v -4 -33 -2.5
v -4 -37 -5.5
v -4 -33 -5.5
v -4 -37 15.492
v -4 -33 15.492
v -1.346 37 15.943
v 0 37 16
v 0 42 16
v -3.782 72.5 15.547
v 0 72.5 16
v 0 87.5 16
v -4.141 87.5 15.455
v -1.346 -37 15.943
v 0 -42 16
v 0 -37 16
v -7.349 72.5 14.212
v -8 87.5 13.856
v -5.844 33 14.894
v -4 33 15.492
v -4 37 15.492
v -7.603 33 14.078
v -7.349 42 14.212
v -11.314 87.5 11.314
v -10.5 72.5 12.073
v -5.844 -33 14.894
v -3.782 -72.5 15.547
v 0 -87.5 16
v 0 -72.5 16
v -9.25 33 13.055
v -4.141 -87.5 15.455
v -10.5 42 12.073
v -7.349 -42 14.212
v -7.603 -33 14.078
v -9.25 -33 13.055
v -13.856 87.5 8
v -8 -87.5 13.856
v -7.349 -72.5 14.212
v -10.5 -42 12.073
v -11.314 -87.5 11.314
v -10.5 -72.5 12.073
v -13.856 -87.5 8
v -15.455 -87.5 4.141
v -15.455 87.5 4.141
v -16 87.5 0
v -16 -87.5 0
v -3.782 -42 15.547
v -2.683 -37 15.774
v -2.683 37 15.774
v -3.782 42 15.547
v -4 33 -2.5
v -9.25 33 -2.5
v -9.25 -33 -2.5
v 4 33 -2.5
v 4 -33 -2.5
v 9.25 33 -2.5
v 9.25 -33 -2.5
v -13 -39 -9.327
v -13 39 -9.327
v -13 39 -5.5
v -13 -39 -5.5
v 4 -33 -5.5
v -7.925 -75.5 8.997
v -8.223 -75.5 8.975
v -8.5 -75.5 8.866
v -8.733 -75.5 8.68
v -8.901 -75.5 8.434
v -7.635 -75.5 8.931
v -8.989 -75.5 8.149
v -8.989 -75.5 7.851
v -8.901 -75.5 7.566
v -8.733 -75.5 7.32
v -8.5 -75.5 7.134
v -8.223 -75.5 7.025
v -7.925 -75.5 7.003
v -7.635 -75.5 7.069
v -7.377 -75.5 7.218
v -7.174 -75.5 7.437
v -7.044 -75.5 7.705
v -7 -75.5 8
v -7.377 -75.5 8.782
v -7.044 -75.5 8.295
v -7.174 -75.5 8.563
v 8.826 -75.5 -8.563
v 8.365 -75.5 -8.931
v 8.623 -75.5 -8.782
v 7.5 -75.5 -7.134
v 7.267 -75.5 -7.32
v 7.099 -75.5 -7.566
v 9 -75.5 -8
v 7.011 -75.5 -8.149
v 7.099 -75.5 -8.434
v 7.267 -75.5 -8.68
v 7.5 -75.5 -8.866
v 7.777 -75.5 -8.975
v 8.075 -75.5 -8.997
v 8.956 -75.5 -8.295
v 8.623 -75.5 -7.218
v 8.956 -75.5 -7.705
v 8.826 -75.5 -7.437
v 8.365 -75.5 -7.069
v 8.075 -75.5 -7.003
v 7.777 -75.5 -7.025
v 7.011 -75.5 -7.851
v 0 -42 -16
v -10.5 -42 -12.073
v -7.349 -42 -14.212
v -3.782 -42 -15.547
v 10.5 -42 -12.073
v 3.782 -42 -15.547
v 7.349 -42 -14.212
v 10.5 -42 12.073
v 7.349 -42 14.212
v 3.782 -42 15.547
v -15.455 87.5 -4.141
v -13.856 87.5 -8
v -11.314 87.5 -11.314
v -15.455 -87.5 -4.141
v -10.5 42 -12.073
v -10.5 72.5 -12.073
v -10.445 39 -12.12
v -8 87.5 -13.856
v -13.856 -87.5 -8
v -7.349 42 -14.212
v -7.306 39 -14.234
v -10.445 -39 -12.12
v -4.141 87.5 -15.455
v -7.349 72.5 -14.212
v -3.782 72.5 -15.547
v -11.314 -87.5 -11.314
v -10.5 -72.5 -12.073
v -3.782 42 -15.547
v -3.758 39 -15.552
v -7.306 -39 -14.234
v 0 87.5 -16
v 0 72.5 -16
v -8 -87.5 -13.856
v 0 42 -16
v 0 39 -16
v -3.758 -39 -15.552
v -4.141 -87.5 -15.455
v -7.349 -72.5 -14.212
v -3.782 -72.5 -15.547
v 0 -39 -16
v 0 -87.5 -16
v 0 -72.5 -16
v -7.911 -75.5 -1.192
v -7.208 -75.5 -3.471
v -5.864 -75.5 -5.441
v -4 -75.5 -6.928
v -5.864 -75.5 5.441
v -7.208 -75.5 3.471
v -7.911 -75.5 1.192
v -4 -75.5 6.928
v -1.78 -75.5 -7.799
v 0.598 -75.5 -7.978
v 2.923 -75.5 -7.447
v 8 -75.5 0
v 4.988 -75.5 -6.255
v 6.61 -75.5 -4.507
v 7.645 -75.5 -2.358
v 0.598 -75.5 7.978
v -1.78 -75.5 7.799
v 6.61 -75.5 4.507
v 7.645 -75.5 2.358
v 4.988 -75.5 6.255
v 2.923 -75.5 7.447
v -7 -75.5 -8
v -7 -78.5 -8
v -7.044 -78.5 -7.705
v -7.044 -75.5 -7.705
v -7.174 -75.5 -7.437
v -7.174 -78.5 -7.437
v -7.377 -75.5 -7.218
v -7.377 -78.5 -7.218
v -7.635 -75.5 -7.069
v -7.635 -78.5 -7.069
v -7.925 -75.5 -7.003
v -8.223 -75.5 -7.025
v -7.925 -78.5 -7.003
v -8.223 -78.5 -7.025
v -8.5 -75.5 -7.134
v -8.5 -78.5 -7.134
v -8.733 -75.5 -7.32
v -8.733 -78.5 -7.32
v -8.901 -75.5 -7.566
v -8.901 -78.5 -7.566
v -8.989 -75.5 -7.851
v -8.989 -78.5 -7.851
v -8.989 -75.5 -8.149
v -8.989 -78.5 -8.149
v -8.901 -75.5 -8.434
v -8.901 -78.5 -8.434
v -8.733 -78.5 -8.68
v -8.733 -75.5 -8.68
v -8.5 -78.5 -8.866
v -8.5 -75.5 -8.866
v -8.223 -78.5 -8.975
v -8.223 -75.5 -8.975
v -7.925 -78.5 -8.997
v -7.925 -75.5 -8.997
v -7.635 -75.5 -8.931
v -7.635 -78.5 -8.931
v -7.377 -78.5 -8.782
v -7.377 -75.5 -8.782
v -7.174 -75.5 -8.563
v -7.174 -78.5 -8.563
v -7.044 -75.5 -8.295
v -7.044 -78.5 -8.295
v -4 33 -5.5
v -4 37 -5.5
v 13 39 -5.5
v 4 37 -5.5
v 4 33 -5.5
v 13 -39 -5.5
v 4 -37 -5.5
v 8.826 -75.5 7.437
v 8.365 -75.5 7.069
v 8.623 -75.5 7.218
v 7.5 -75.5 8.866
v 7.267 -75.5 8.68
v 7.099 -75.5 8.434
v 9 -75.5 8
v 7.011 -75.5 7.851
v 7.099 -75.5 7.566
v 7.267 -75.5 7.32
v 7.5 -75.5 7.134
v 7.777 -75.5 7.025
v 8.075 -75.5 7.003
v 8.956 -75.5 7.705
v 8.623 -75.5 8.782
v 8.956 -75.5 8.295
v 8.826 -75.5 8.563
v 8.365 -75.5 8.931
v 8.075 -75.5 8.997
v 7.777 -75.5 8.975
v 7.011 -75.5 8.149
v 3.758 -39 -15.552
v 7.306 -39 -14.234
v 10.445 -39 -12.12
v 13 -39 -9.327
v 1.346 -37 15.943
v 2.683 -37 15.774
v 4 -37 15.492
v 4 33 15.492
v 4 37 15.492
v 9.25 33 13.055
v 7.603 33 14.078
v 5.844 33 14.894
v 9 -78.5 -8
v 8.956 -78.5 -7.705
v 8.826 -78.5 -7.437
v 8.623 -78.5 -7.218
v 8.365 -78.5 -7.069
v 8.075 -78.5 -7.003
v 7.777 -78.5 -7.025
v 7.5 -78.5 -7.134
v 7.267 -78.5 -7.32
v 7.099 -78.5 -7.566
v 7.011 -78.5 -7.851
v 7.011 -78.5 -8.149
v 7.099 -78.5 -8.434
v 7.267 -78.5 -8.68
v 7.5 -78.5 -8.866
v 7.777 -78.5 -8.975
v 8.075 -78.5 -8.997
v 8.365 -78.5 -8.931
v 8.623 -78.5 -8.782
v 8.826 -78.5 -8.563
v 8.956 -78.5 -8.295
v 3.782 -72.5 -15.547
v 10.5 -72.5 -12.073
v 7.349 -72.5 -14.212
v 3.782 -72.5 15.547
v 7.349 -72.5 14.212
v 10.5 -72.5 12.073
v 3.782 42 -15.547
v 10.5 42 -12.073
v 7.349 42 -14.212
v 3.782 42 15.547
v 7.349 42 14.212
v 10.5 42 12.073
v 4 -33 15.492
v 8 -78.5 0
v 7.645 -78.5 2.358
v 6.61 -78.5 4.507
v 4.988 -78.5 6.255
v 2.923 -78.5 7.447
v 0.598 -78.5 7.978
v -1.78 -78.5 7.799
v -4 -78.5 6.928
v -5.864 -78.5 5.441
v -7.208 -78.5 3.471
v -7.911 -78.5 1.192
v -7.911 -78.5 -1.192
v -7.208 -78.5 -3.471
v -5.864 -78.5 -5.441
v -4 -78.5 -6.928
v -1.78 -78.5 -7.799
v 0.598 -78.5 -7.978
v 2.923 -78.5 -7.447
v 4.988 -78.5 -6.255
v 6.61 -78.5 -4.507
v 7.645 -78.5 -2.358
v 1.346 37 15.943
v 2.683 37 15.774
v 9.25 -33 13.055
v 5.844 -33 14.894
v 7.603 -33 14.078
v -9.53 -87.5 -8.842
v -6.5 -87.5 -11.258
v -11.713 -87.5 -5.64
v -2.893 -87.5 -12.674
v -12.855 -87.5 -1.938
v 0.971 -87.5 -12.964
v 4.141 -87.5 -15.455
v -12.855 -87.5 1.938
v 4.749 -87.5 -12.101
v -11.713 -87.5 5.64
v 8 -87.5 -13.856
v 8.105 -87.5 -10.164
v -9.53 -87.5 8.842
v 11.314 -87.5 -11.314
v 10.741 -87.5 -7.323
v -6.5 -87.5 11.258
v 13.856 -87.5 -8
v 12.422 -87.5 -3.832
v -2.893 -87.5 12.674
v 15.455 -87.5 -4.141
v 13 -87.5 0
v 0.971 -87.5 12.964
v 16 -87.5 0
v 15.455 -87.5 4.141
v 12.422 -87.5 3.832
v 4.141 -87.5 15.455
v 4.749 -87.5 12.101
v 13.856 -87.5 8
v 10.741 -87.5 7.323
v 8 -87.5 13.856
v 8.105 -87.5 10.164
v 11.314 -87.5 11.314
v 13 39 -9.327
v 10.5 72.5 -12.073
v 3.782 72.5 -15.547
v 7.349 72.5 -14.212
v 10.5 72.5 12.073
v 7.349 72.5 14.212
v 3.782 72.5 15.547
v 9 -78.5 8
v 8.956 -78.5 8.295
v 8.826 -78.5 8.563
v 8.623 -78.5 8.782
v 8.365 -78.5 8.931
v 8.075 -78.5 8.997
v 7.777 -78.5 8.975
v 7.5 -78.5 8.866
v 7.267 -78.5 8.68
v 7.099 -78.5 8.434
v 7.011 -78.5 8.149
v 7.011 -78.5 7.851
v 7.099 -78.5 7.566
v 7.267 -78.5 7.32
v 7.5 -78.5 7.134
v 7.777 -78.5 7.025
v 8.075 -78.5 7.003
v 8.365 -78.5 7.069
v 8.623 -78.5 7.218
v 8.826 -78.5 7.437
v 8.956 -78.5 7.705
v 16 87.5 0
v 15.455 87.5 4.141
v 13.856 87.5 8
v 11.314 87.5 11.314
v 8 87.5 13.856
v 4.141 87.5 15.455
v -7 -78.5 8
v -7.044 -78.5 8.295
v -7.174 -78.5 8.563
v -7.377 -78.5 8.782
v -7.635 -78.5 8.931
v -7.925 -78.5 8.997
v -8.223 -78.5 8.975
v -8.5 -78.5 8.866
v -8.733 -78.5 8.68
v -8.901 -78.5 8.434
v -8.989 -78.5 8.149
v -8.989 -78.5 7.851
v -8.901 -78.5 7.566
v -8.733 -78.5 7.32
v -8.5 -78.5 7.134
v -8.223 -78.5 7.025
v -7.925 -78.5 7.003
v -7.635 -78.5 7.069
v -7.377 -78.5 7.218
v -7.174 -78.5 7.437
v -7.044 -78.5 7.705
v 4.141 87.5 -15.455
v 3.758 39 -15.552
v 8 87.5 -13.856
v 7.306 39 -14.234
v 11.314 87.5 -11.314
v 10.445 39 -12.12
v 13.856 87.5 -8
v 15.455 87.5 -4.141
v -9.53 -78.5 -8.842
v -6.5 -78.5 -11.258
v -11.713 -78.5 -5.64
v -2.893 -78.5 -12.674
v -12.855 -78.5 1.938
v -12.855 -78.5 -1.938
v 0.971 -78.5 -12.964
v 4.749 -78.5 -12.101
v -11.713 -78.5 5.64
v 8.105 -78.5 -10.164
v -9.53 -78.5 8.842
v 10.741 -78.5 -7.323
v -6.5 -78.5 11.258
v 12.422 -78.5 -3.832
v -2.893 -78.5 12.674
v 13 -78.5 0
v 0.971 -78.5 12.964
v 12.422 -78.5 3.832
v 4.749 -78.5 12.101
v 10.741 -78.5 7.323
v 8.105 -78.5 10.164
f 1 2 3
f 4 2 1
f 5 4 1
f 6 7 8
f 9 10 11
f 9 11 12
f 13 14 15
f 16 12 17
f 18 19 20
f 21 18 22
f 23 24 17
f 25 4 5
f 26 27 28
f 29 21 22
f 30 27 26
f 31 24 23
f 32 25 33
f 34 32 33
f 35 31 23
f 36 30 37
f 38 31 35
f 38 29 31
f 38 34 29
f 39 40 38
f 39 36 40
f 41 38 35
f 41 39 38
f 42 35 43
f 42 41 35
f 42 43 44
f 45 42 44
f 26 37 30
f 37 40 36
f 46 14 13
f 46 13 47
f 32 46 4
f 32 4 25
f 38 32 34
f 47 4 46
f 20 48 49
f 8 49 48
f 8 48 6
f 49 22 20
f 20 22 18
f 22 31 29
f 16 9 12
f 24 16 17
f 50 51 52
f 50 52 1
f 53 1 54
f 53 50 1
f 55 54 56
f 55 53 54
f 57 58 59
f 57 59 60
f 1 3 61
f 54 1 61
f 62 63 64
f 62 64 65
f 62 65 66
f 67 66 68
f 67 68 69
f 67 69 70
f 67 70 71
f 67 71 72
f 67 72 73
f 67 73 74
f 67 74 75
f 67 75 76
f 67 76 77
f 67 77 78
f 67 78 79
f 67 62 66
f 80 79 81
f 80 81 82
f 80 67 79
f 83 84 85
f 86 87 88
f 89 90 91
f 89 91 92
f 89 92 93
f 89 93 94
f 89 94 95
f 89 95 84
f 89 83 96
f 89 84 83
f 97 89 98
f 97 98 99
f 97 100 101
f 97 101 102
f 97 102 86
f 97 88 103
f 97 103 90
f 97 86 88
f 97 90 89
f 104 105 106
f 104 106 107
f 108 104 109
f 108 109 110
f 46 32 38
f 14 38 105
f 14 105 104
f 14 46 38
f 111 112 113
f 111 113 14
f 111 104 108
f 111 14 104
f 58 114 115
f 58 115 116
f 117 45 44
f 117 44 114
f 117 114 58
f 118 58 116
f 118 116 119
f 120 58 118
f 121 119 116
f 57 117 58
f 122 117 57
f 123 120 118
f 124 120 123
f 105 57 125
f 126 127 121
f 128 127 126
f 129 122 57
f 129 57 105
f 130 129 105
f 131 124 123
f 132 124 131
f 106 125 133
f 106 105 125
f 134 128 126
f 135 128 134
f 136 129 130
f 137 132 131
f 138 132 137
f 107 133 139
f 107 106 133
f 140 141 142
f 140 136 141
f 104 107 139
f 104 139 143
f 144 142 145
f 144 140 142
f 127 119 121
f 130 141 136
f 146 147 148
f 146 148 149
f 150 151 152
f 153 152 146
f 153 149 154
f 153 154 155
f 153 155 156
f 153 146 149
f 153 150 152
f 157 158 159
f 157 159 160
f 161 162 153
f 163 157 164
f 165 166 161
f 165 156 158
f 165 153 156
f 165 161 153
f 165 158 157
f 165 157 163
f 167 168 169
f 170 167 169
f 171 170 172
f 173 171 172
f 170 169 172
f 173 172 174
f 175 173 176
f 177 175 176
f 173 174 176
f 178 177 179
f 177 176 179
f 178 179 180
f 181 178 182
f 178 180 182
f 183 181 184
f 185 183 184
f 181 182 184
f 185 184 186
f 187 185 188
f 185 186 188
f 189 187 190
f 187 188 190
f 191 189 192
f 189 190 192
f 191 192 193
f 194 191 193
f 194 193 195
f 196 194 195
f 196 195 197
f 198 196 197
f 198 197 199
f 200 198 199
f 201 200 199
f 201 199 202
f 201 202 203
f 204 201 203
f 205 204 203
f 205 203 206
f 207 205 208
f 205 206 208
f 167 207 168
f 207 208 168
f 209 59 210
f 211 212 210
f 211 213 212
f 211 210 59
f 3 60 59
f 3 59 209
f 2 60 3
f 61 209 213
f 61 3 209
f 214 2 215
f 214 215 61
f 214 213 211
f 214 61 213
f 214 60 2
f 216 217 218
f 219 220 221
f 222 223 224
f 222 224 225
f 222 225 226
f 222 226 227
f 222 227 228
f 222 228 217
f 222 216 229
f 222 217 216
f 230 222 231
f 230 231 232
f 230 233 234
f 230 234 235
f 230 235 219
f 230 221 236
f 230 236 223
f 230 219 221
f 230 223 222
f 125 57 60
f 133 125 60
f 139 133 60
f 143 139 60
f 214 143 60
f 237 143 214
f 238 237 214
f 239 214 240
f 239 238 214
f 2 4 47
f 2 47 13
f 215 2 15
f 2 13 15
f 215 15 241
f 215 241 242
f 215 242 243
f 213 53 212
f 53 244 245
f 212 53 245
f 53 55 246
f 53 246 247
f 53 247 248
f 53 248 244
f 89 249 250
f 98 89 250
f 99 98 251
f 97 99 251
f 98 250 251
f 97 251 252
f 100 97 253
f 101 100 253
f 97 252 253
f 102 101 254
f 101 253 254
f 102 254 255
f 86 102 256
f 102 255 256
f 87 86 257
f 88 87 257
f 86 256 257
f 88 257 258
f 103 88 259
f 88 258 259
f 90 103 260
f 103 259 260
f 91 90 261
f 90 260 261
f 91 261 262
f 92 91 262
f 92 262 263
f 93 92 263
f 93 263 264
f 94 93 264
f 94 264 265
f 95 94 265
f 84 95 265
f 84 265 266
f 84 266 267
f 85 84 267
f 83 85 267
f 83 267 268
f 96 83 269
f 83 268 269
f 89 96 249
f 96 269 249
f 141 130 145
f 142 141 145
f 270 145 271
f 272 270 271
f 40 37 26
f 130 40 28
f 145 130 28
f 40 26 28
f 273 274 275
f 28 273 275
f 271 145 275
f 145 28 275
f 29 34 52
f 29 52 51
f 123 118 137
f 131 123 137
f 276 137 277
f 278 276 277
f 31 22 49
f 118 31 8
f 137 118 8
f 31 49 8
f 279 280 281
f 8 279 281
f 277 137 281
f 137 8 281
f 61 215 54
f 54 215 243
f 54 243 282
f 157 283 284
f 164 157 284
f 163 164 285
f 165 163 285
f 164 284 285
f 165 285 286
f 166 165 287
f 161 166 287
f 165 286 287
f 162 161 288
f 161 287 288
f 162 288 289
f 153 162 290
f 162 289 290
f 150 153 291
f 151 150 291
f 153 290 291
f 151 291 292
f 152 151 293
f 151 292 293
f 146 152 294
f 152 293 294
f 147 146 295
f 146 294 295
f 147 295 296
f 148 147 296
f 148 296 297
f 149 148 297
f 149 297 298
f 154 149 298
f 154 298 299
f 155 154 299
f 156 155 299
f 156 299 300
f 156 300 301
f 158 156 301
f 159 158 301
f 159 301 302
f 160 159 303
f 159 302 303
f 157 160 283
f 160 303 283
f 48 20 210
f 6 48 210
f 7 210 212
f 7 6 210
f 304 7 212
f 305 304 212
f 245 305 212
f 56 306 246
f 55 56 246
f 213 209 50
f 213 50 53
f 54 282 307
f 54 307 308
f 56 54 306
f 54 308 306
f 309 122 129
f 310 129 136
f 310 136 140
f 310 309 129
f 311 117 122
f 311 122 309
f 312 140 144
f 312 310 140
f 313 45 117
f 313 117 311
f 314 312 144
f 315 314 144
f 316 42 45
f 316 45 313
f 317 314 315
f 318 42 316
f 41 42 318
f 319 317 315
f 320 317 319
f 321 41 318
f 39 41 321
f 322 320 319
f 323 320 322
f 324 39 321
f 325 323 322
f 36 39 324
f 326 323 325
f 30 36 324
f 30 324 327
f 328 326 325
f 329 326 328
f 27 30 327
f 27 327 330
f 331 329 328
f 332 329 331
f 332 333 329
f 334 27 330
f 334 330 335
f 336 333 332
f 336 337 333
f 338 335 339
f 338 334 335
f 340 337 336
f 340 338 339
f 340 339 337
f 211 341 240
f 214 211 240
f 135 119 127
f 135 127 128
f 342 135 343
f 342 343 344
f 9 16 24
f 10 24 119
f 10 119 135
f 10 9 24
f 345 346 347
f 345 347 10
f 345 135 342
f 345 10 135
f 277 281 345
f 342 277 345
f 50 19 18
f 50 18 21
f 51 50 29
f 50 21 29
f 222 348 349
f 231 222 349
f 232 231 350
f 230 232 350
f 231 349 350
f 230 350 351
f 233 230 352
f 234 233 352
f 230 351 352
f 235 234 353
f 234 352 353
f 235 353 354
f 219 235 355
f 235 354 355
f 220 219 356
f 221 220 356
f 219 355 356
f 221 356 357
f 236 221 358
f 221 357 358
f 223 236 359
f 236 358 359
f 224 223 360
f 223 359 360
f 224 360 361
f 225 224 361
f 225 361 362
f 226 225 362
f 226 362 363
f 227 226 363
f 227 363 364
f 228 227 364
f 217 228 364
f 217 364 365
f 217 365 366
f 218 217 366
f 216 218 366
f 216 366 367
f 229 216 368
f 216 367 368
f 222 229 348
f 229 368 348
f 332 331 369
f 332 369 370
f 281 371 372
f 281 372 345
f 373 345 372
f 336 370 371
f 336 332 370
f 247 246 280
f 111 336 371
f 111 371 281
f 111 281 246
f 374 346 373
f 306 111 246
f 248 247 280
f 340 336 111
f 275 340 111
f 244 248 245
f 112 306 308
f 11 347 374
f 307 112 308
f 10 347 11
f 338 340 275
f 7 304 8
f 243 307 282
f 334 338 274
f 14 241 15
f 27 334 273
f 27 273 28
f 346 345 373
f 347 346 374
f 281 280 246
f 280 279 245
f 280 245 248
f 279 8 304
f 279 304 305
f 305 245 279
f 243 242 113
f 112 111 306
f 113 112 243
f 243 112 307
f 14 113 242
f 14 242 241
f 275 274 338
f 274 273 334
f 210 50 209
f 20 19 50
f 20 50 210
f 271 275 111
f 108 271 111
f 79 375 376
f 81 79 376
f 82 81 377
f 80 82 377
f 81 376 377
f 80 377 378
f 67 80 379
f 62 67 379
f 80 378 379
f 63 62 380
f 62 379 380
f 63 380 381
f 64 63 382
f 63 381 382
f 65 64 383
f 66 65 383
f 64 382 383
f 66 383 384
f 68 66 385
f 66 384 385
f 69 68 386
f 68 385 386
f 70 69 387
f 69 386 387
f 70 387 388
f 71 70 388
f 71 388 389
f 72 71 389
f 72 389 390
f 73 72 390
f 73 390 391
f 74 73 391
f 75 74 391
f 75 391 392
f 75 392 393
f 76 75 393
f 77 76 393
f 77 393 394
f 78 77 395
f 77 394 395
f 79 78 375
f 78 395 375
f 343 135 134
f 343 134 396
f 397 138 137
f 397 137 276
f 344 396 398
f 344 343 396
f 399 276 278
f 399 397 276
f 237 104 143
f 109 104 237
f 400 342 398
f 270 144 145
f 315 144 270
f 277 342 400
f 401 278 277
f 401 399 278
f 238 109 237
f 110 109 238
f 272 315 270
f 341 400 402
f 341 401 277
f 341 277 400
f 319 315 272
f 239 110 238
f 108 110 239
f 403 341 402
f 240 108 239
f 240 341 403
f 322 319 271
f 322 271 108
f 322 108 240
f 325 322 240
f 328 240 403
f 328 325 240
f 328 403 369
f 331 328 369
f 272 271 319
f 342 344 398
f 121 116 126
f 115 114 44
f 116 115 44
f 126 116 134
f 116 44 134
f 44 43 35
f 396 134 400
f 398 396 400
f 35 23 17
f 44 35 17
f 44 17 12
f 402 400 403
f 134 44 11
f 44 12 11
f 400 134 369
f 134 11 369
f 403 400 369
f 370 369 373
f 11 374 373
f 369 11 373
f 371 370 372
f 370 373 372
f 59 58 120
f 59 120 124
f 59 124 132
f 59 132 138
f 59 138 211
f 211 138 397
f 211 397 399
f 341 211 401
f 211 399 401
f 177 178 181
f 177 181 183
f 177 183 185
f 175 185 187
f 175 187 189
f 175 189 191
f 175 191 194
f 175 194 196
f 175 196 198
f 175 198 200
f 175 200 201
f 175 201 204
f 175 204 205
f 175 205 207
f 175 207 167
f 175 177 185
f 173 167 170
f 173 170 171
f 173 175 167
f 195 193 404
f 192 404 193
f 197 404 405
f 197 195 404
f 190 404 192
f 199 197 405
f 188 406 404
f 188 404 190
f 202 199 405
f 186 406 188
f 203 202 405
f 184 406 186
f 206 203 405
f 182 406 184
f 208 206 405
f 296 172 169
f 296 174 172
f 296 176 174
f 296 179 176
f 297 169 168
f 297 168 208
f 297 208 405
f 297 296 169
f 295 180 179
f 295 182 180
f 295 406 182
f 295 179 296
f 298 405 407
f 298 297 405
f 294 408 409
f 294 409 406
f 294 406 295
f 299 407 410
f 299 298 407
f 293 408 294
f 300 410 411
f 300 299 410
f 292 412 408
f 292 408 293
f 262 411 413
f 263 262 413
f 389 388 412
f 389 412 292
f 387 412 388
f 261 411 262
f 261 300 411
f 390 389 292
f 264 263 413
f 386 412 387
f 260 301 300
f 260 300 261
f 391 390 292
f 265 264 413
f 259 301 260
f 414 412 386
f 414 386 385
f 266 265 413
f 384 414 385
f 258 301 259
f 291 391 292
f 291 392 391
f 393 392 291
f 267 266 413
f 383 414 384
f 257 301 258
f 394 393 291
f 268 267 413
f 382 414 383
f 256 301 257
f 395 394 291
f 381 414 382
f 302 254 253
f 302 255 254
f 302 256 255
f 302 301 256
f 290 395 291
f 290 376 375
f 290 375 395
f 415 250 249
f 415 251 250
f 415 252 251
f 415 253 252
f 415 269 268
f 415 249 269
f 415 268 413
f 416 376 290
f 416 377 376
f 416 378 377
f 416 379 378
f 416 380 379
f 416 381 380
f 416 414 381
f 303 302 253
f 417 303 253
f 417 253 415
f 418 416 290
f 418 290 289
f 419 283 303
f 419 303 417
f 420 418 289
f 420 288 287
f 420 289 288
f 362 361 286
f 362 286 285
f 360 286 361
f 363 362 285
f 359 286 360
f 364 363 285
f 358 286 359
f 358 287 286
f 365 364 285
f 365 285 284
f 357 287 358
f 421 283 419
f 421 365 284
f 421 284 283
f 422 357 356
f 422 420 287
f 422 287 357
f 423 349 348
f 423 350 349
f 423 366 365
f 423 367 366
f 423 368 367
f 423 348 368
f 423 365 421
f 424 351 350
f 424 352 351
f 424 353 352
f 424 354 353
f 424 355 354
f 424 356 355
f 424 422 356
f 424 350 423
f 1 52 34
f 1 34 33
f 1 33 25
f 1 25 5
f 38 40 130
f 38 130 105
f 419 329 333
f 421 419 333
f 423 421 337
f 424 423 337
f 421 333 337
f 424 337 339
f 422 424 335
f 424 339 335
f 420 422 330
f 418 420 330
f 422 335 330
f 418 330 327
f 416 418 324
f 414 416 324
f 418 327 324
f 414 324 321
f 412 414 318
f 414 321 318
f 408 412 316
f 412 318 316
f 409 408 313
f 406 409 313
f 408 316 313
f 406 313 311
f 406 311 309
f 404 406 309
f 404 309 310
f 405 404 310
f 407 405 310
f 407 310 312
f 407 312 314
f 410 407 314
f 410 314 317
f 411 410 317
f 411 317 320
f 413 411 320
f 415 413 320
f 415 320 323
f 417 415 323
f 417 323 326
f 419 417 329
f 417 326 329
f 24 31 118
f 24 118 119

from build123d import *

# Parameters (mm, degrees)
F5_W      = 32
F5_H      = 175
F6_DEPTH  = 16
F7_W      = 21
F7_H      = 30.5
F8_DEPTH  = 32.001
F9_W      = 5.25
F9_H      = 66
F9_W_2    = 8
F9_H_2    = 4
F10_DEPTH = 18.5
F12_W     = 26
F12_H     = 78
F13_DEPTH = 10.5
F14_DEPTH = 175.001
F15_W     = 8
F15_H     = 4
F16_DEPTH = 21.501
F17_R     = 13
F18_DEPTH = 9
F19_R     = 1
F19_R_2   = 8
F20_DEPTH = 3


with BuildPart() as f6:
    # F5 (on Top) → F6 (new body, symmetric)
    with BuildSketch(Plane.XY):
        Rectangle(F5_W, F5_H)
    extrude(amount=F6_DEPTH, both=True)

    # F7 (on face) → F8 (cut, through all)
    with BuildSketch(Plane.XY.offset(16)):
        with Locations((0, 57.25)):
            Rectangle(F7_W, F7_H)
        with Locations((0, -57.25)):
            Rectangle(F7_W, F7_H)
    extrude(amount=-F8_DEPTH, mode=Mode.SUBTRACT)

    # F9 (on face) → F10 (cut)
    with BuildSketch(Plane.XY.offset(16)):
        with Locations((6.625, 0)):
            Rectangle(F9_W, F9_H)
        Rectangle(F9_W_2, F9_H)
        with Locations((-6.625, 0)):
            Rectangle(F9_W, F9_H)
        with Locations((0, 35)):
            Rectangle(F9_W_2, F9_H_2)
        with Locations((0, -35)):
            Rectangle(F9_W_2, F9_H_2)
    extrude(amount=-F10_DEPTH, mode=Mode.SUBTRACT)

    # F12 (on face) → F13 (cut)
    with BuildSketch(Plane(origin=(0, 0, -16), x_dir=(1, 0, 0), z_dir=(0, 0, -1))):
        Rectangle(F12_W, F12_H)
    extrude(amount=-F13_DEPTH, mode=Mode.SUBTRACT)

    # F11 (on face) → F14 (intersect, through all)
    with BuildSketch(Plane.XZ.offset(87.5)):
        with BuildLine():
            ThreePointArc((0, -16), (11.313708499, -11.313708499), (16, 0))
            ThreePointArc((16, 0), (11.313708499, 11.313708499), (0, 16))
            ThreePointArc((0, 16), (-11.313708499, 11.313708499), (-16, 0))
            ThreePointArc((-16, 0), (-11.313708499, -11.313708499), (0, -16))
        make_face()
    extrude(amount=-F14_DEPTH, mode=Mode.INTERSECT)

    # F15 (on face) → F16 (cut, through all)
    with BuildSketch(Plane(origin=(0, 0, -5.5), x_dir=(1, 0, 0), z_dir=(0, 0, -1))):
        with Locations((0, 35)):
            Rectangle(F15_W, F15_H)
        with Locations((0, -35)):
            Rectangle(F15_W, F15_H)
    extrude(amount=-F16_DEPTH, mode=Mode.SUBTRACT)

    # F17 (on face) → F18 (cut)
    with BuildSketch(Plane.XZ.offset(87.5)):
        Circle(F17_R)
    extrude(amount=-F18_DEPTH, mode=Mode.SUBTRACT)

    # F19 (on face) → F20 (cut)
    with BuildSketch(Plane.XZ.offset(78.5)):
        with Locations((8, -8)):
            Circle(F19_R)
        with Locations((-8, -8)):
            Circle(F19_R)
        with Locations((-8, 8)):
            Circle(F19_R)
        with Locations((8, 8)):
            Circle(F19_R)
        Circle(F19_R_2)
    extrude(amount=-F20_DEPTH, mode=Mode.SUBTRACT)


solid = f6.part
